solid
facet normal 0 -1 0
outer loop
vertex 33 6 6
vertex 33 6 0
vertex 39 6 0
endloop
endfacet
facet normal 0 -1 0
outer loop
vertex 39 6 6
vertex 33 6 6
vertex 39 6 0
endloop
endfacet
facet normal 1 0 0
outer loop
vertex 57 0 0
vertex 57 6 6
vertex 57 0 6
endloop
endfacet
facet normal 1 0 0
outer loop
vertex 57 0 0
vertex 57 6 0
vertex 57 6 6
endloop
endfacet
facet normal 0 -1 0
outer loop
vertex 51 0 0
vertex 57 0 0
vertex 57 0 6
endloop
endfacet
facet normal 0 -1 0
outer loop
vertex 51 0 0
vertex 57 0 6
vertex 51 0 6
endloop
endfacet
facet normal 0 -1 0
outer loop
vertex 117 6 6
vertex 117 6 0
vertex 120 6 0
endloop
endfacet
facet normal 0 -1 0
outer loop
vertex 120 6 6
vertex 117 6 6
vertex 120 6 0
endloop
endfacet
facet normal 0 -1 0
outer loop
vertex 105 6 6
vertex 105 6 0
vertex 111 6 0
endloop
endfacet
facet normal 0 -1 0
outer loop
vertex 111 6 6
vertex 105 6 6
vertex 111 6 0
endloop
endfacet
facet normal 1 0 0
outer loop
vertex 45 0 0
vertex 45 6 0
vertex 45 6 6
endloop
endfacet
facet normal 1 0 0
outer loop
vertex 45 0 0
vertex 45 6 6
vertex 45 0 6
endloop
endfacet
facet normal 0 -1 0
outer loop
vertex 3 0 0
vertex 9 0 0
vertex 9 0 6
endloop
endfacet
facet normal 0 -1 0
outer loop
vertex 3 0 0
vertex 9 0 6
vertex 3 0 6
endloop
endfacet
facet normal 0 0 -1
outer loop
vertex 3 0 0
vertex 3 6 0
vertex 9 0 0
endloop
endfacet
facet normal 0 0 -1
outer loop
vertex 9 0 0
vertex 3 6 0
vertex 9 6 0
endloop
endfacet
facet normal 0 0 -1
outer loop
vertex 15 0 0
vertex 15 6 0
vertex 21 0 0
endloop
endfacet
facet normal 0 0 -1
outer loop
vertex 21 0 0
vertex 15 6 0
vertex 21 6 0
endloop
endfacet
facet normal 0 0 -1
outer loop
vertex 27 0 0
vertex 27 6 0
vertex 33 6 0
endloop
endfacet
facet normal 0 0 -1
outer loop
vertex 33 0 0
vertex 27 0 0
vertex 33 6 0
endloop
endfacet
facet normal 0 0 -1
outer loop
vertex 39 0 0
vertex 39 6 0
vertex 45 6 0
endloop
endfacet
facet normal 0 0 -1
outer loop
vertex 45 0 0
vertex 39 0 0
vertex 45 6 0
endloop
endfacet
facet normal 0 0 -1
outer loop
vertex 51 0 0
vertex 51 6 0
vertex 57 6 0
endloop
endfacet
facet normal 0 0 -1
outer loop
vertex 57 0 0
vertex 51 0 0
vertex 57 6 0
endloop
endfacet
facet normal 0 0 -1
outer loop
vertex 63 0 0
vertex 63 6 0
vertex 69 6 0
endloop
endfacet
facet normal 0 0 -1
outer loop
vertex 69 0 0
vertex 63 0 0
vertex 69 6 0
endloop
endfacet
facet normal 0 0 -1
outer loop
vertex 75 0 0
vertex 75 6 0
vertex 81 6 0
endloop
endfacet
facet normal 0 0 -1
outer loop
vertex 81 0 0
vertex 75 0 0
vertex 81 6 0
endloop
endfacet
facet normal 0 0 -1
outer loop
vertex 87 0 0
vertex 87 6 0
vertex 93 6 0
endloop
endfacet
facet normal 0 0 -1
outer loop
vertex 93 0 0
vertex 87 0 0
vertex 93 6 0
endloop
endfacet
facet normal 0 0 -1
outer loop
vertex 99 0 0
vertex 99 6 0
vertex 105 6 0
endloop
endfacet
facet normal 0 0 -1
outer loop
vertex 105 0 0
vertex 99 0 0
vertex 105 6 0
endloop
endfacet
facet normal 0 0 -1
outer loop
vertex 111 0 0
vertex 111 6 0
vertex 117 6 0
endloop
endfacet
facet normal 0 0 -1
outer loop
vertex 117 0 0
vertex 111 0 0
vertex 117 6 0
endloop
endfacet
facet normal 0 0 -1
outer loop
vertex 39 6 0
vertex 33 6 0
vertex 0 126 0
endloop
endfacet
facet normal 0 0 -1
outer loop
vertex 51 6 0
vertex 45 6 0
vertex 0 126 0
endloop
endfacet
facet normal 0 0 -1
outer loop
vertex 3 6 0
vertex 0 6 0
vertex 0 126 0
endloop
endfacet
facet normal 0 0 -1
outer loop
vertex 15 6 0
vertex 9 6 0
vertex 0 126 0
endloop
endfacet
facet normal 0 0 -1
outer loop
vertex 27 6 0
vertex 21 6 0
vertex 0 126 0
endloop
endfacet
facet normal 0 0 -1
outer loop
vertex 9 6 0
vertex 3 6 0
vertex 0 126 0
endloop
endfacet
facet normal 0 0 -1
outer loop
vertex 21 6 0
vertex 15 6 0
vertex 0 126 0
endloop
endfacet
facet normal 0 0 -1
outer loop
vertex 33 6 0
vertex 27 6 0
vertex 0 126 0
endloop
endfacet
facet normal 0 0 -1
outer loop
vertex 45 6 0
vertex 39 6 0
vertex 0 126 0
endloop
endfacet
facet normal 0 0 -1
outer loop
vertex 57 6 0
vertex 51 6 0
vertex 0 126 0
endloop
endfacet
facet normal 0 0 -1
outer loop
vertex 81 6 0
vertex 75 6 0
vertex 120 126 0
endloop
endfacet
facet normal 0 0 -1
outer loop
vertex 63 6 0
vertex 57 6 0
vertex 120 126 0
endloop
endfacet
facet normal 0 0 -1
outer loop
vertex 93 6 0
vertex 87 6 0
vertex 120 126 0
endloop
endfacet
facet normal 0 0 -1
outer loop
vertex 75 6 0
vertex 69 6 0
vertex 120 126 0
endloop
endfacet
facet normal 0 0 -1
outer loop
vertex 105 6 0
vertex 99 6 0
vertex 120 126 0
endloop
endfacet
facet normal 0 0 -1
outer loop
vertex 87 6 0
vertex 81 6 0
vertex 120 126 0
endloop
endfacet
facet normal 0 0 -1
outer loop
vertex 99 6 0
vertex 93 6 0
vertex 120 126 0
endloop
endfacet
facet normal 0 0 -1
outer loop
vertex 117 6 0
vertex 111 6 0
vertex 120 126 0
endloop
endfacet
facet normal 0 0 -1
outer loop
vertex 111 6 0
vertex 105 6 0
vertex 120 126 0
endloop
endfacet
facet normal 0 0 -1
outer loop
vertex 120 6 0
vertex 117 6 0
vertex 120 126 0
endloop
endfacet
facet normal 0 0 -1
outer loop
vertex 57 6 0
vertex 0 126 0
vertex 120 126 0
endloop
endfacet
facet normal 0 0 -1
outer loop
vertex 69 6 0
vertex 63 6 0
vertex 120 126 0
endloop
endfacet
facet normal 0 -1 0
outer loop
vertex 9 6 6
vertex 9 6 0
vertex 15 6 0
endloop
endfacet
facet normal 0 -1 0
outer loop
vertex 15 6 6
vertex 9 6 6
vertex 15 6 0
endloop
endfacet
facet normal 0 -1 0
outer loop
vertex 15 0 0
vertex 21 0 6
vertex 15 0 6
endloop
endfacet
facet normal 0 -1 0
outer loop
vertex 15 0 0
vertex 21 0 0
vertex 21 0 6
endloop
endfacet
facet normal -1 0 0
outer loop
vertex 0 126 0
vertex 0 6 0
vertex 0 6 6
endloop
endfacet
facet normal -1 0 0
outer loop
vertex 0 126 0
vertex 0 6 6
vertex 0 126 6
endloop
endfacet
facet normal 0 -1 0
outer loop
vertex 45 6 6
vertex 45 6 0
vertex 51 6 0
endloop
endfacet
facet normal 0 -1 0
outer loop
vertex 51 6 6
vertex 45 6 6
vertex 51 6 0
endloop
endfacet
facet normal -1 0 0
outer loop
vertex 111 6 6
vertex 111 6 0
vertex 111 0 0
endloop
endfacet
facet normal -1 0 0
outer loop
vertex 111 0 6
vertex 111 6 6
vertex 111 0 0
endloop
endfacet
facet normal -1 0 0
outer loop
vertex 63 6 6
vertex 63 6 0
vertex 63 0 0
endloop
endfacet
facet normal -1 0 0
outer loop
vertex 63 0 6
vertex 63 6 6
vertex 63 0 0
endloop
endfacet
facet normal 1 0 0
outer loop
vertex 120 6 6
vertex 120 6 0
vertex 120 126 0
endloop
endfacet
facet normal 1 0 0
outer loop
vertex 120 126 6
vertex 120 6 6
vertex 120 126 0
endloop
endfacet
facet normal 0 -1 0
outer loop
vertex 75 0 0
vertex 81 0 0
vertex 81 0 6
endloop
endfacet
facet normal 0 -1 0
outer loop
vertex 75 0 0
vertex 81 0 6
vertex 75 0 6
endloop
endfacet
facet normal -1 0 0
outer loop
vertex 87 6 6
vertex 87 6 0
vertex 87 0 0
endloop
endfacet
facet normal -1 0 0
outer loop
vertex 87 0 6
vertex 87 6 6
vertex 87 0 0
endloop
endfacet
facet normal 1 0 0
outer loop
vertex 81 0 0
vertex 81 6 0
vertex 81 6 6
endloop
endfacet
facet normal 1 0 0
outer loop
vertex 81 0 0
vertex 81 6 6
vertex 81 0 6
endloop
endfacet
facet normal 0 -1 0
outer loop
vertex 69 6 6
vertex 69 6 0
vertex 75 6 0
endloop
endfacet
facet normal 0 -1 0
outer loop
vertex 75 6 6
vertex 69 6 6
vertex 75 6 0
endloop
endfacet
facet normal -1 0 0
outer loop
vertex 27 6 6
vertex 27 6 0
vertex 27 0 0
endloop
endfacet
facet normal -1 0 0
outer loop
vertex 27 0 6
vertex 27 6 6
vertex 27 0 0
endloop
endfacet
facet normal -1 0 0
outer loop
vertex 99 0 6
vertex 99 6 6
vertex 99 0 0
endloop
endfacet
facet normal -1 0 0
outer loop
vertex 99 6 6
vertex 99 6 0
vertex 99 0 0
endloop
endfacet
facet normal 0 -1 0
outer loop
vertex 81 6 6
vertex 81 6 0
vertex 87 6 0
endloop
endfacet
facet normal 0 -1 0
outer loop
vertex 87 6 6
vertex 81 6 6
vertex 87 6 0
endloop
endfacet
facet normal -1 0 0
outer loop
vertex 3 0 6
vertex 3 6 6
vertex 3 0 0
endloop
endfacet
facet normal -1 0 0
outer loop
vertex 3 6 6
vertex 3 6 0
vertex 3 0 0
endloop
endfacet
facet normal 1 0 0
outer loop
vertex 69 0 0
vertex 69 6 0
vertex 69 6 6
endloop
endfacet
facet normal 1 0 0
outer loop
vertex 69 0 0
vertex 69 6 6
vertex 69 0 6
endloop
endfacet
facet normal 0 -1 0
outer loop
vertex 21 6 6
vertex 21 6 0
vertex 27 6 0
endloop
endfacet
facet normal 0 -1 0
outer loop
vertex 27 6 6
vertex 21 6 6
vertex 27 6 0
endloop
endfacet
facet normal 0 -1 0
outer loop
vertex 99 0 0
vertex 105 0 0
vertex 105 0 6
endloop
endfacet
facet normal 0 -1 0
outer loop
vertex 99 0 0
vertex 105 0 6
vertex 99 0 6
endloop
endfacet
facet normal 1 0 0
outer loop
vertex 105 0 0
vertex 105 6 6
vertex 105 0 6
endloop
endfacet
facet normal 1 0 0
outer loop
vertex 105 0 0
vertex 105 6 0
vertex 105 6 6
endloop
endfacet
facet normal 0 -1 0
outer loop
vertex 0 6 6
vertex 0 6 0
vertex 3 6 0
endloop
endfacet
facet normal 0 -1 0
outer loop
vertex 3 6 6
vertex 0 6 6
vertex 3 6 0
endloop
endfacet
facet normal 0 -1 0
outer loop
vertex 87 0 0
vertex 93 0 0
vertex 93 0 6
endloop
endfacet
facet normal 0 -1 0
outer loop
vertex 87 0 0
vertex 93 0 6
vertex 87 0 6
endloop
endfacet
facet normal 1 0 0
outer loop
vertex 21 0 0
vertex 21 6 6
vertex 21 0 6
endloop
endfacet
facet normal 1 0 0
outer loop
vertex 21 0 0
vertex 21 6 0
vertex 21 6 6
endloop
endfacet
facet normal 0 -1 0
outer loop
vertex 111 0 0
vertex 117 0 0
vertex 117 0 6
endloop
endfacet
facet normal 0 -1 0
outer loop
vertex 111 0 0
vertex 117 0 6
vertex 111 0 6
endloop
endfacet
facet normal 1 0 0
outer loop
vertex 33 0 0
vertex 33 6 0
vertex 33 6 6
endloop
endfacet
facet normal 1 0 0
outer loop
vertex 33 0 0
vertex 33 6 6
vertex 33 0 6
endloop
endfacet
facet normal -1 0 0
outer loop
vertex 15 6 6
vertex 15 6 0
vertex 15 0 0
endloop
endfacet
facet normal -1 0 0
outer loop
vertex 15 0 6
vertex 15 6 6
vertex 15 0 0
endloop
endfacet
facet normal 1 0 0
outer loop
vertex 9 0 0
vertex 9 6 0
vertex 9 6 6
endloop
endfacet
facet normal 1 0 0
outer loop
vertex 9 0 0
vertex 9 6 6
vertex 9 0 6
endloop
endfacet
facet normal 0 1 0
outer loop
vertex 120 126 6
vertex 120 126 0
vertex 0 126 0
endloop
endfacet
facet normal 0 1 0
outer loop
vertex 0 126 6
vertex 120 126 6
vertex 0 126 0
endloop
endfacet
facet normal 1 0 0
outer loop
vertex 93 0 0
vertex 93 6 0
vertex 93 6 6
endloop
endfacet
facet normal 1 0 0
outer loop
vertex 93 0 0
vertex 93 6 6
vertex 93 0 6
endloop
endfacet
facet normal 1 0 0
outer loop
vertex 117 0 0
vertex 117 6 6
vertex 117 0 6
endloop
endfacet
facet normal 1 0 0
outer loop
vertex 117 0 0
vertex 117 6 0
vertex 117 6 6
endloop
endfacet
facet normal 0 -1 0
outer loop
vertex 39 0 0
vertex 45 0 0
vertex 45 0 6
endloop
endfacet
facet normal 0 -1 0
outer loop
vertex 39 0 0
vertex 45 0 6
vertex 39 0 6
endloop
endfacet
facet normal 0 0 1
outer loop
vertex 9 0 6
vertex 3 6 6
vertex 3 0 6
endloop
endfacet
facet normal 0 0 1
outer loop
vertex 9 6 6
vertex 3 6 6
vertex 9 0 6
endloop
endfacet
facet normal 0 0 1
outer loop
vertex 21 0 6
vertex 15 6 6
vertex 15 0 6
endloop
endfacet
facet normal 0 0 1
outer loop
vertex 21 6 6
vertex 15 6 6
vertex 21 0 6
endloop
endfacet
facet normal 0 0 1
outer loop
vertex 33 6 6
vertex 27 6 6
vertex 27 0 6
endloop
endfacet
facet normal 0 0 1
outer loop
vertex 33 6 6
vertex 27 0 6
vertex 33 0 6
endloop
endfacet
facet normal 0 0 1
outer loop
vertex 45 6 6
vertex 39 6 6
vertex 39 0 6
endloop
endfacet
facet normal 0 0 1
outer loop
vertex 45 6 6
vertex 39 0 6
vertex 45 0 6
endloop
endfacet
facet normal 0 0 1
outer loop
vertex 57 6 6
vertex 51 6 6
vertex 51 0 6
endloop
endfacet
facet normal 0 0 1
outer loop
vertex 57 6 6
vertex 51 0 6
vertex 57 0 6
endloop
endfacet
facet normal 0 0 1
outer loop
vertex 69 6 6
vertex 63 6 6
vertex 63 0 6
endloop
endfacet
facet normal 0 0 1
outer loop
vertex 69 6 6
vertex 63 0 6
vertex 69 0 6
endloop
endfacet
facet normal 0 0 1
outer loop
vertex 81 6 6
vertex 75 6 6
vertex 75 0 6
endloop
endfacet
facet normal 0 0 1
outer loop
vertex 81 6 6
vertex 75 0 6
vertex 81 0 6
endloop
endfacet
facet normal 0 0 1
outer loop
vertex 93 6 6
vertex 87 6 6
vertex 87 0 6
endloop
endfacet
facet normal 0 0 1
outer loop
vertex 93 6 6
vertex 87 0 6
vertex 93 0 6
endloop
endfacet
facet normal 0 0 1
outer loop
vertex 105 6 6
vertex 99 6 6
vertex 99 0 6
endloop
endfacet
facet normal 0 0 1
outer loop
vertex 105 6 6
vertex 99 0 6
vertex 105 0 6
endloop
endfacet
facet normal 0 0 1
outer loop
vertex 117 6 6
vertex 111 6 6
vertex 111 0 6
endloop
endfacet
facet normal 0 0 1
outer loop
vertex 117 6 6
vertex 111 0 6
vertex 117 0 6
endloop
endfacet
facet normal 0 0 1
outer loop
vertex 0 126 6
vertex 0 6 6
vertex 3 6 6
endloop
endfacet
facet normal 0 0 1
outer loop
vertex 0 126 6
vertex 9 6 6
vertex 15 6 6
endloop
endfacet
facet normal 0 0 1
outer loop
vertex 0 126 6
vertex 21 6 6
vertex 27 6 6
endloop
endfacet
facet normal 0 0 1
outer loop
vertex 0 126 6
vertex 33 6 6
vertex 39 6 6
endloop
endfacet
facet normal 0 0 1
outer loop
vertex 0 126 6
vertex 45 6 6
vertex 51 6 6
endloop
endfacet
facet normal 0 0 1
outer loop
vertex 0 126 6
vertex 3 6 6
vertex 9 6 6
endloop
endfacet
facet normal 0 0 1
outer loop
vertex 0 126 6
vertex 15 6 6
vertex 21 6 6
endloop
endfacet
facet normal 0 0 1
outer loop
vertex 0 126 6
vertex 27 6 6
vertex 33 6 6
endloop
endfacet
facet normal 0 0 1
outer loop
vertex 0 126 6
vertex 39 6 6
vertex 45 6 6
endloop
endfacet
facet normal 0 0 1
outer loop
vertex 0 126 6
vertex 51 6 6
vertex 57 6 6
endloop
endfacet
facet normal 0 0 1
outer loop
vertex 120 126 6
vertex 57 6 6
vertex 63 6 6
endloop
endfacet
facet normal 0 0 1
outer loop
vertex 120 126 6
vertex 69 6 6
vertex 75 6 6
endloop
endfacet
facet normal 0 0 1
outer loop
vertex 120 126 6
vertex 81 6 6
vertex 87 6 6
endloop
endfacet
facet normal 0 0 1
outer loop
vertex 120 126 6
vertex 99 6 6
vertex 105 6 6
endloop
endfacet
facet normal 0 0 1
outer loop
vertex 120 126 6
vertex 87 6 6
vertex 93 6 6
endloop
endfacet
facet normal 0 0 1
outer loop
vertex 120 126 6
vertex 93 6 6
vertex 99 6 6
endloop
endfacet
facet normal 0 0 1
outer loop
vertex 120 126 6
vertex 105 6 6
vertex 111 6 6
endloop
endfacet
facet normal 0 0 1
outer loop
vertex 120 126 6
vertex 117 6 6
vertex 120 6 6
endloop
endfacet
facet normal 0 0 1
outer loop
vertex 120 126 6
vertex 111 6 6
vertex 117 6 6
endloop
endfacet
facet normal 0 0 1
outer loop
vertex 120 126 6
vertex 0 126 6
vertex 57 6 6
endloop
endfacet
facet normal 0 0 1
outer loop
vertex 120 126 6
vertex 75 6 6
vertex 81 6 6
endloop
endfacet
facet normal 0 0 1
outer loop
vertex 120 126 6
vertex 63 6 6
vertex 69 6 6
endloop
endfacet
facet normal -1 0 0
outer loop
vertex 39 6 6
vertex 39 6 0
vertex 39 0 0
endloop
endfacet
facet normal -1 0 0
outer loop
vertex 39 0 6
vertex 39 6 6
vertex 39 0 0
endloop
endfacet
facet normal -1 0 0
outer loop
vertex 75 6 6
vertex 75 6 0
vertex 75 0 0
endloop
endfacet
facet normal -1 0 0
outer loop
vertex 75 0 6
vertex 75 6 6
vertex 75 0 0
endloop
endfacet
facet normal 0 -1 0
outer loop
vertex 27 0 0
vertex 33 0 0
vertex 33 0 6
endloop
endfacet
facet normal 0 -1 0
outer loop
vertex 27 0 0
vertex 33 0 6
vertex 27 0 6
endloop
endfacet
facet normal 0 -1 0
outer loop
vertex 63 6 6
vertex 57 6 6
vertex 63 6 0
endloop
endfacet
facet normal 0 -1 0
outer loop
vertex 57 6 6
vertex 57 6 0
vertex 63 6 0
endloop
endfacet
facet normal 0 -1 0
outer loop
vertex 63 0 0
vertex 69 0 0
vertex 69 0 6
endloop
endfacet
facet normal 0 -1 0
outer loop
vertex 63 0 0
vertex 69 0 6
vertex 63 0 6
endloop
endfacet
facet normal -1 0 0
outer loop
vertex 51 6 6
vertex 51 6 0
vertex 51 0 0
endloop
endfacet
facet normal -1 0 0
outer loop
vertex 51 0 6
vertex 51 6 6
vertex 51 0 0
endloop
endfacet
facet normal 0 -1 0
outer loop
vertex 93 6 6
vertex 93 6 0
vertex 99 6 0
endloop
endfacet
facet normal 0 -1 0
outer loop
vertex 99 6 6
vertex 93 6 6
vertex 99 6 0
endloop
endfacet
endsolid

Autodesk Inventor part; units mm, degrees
ref_plane "YZ Plane" through (0, 0, 0) normal (1, 0, 0) x (0, 1, 0)
ref_plane "XZ Plane" through (0, 0, 0) normal (0, 1, 0) x (-1, 0, 0)
ref_plane "XY Plane" through (0, 0, 0) normal (0, 0, 1) x (1, 0, 0)
sketch "Sketch1" plane through (0, 0, 0) normal (0, 0, 1) x (1, 0, 0)
  line L0 (0, 6) -> (120, 6)
  line L1 (120, 6) -> (120, 0)
  line L2 (120, 0) -> (0, 0)
  line L3 (0, 0) -> (0, 6)
  line L4 (3, 6) -> (3, 0)
  line L5 (9, 6) -> (9, 0)
  line L6 (9, 6) -> (9, 0)
  line L7 (15, 6) -> (15, 0)
  line L8 (15, 6) -> (15, 0)
  line L9 (21, 6) -> (21, 0)
  line L10 (21, 6) -> (21, 0)
  line L11 (27, 6) -> (27, 0)
  line L12 (27, 6) -> (27, 0)
  line L13 (33, 6) -> (33, 0)
  line L14 (33, 6) -> (33, 0)
  line L15 (39, 6) -> (39, 0)
  line L16 (39, 6) -> (39, 0)
  line L17 (45, 6) -> (45, 0)
  line L18 (45, 6) -> (45, 0)
  line L19 (51, 6) -> (51, 0)
  line L20 (51, 6) -> (51, 0)
  line L21 (57, 6) -> (57, 0)
  line L22 (57, 6) -> (57, 0)
  line L23 (63, 6) -> (63, 0)
  line L24 (63, 6) -> (63, 0)
  line L25 (69, 6) -> (69, 0)
  line L26 (69, 6) -> (69, 0)
  line L27 (75, 6) -> (75, 0)
  line L28 (75, 6) -> (75, 0)
  line L29 (81, 6) -> (81, 0)
  line L30 (81, 6) -> (81, 0)
  line L31 (87, 6) -> (87, 0)
  line L32 (87, 6) -> (87, 0)
  line L33 (93, 6) -> (93, 0)
  line L34 (93, 6) -> (93, 0)
  line L35 (99, 6) -> (99, 0)
  line L36 (99, 6) -> (99, 0)
  line L37 (105, 6) -> (105, 0)
  line L38 (105, 6) -> (105, 0)
  line L39 (111, 6) -> (111, 0)
  line L40 (111, 6) -> (111, 0)
  line L41 (117, 6) -> (117, 0)
  line L42 (0, 6) -> (0, 126)
  line L43 (120, 6) -> (120, 126)
  line L44 (120, 126) -> (0, 126)
  point P0 (0, 3)
  point P1 (3, 3)
  point P2 (9, 3)
  point P3 (15, 3)
  point P4 (21, 3)
  point P5 (27, 3)
  point P6 (33, 3)
  point P7 (39, 3)
  point P8 (45, 3)
  point P9 (51, 3)
  point P10 (57, 3)
  point P11 (63, 3)
  point P12 (69, 3)
  point P13 (75, 3)
  point P14 (81, 3)
  point P15 (87, 3)
  point P16 (93, 3)
  point P17 (99, 3)
  point P18 (105, 3)
  point P19 (111, 3)
  dimension "d4" = 120
  dimension "d5" = 6
  dimension "d6" = 3
  dimension "d7" = 6
  dimension "d8" = 6
  dimension "d10" = 120
  dimension "d11" = 120
extrude "Extrusion1" add sketch "Sketch1" along normal blind 6 contours L42 L44 L43 L0 | L0 L5 L2 L4 | L0 L9 L2 L7 | L41 L2 L39 L0 | L0 L13 L2 L11 | L37 L2 L35 L0 | L0 L17 L2 L15 | L33 L2 L31 L0 | L0 L21 L2 L19 | L29 L2 L27 L0 | L0 L25 L2 L23
properties part number "wall inteface V1"
